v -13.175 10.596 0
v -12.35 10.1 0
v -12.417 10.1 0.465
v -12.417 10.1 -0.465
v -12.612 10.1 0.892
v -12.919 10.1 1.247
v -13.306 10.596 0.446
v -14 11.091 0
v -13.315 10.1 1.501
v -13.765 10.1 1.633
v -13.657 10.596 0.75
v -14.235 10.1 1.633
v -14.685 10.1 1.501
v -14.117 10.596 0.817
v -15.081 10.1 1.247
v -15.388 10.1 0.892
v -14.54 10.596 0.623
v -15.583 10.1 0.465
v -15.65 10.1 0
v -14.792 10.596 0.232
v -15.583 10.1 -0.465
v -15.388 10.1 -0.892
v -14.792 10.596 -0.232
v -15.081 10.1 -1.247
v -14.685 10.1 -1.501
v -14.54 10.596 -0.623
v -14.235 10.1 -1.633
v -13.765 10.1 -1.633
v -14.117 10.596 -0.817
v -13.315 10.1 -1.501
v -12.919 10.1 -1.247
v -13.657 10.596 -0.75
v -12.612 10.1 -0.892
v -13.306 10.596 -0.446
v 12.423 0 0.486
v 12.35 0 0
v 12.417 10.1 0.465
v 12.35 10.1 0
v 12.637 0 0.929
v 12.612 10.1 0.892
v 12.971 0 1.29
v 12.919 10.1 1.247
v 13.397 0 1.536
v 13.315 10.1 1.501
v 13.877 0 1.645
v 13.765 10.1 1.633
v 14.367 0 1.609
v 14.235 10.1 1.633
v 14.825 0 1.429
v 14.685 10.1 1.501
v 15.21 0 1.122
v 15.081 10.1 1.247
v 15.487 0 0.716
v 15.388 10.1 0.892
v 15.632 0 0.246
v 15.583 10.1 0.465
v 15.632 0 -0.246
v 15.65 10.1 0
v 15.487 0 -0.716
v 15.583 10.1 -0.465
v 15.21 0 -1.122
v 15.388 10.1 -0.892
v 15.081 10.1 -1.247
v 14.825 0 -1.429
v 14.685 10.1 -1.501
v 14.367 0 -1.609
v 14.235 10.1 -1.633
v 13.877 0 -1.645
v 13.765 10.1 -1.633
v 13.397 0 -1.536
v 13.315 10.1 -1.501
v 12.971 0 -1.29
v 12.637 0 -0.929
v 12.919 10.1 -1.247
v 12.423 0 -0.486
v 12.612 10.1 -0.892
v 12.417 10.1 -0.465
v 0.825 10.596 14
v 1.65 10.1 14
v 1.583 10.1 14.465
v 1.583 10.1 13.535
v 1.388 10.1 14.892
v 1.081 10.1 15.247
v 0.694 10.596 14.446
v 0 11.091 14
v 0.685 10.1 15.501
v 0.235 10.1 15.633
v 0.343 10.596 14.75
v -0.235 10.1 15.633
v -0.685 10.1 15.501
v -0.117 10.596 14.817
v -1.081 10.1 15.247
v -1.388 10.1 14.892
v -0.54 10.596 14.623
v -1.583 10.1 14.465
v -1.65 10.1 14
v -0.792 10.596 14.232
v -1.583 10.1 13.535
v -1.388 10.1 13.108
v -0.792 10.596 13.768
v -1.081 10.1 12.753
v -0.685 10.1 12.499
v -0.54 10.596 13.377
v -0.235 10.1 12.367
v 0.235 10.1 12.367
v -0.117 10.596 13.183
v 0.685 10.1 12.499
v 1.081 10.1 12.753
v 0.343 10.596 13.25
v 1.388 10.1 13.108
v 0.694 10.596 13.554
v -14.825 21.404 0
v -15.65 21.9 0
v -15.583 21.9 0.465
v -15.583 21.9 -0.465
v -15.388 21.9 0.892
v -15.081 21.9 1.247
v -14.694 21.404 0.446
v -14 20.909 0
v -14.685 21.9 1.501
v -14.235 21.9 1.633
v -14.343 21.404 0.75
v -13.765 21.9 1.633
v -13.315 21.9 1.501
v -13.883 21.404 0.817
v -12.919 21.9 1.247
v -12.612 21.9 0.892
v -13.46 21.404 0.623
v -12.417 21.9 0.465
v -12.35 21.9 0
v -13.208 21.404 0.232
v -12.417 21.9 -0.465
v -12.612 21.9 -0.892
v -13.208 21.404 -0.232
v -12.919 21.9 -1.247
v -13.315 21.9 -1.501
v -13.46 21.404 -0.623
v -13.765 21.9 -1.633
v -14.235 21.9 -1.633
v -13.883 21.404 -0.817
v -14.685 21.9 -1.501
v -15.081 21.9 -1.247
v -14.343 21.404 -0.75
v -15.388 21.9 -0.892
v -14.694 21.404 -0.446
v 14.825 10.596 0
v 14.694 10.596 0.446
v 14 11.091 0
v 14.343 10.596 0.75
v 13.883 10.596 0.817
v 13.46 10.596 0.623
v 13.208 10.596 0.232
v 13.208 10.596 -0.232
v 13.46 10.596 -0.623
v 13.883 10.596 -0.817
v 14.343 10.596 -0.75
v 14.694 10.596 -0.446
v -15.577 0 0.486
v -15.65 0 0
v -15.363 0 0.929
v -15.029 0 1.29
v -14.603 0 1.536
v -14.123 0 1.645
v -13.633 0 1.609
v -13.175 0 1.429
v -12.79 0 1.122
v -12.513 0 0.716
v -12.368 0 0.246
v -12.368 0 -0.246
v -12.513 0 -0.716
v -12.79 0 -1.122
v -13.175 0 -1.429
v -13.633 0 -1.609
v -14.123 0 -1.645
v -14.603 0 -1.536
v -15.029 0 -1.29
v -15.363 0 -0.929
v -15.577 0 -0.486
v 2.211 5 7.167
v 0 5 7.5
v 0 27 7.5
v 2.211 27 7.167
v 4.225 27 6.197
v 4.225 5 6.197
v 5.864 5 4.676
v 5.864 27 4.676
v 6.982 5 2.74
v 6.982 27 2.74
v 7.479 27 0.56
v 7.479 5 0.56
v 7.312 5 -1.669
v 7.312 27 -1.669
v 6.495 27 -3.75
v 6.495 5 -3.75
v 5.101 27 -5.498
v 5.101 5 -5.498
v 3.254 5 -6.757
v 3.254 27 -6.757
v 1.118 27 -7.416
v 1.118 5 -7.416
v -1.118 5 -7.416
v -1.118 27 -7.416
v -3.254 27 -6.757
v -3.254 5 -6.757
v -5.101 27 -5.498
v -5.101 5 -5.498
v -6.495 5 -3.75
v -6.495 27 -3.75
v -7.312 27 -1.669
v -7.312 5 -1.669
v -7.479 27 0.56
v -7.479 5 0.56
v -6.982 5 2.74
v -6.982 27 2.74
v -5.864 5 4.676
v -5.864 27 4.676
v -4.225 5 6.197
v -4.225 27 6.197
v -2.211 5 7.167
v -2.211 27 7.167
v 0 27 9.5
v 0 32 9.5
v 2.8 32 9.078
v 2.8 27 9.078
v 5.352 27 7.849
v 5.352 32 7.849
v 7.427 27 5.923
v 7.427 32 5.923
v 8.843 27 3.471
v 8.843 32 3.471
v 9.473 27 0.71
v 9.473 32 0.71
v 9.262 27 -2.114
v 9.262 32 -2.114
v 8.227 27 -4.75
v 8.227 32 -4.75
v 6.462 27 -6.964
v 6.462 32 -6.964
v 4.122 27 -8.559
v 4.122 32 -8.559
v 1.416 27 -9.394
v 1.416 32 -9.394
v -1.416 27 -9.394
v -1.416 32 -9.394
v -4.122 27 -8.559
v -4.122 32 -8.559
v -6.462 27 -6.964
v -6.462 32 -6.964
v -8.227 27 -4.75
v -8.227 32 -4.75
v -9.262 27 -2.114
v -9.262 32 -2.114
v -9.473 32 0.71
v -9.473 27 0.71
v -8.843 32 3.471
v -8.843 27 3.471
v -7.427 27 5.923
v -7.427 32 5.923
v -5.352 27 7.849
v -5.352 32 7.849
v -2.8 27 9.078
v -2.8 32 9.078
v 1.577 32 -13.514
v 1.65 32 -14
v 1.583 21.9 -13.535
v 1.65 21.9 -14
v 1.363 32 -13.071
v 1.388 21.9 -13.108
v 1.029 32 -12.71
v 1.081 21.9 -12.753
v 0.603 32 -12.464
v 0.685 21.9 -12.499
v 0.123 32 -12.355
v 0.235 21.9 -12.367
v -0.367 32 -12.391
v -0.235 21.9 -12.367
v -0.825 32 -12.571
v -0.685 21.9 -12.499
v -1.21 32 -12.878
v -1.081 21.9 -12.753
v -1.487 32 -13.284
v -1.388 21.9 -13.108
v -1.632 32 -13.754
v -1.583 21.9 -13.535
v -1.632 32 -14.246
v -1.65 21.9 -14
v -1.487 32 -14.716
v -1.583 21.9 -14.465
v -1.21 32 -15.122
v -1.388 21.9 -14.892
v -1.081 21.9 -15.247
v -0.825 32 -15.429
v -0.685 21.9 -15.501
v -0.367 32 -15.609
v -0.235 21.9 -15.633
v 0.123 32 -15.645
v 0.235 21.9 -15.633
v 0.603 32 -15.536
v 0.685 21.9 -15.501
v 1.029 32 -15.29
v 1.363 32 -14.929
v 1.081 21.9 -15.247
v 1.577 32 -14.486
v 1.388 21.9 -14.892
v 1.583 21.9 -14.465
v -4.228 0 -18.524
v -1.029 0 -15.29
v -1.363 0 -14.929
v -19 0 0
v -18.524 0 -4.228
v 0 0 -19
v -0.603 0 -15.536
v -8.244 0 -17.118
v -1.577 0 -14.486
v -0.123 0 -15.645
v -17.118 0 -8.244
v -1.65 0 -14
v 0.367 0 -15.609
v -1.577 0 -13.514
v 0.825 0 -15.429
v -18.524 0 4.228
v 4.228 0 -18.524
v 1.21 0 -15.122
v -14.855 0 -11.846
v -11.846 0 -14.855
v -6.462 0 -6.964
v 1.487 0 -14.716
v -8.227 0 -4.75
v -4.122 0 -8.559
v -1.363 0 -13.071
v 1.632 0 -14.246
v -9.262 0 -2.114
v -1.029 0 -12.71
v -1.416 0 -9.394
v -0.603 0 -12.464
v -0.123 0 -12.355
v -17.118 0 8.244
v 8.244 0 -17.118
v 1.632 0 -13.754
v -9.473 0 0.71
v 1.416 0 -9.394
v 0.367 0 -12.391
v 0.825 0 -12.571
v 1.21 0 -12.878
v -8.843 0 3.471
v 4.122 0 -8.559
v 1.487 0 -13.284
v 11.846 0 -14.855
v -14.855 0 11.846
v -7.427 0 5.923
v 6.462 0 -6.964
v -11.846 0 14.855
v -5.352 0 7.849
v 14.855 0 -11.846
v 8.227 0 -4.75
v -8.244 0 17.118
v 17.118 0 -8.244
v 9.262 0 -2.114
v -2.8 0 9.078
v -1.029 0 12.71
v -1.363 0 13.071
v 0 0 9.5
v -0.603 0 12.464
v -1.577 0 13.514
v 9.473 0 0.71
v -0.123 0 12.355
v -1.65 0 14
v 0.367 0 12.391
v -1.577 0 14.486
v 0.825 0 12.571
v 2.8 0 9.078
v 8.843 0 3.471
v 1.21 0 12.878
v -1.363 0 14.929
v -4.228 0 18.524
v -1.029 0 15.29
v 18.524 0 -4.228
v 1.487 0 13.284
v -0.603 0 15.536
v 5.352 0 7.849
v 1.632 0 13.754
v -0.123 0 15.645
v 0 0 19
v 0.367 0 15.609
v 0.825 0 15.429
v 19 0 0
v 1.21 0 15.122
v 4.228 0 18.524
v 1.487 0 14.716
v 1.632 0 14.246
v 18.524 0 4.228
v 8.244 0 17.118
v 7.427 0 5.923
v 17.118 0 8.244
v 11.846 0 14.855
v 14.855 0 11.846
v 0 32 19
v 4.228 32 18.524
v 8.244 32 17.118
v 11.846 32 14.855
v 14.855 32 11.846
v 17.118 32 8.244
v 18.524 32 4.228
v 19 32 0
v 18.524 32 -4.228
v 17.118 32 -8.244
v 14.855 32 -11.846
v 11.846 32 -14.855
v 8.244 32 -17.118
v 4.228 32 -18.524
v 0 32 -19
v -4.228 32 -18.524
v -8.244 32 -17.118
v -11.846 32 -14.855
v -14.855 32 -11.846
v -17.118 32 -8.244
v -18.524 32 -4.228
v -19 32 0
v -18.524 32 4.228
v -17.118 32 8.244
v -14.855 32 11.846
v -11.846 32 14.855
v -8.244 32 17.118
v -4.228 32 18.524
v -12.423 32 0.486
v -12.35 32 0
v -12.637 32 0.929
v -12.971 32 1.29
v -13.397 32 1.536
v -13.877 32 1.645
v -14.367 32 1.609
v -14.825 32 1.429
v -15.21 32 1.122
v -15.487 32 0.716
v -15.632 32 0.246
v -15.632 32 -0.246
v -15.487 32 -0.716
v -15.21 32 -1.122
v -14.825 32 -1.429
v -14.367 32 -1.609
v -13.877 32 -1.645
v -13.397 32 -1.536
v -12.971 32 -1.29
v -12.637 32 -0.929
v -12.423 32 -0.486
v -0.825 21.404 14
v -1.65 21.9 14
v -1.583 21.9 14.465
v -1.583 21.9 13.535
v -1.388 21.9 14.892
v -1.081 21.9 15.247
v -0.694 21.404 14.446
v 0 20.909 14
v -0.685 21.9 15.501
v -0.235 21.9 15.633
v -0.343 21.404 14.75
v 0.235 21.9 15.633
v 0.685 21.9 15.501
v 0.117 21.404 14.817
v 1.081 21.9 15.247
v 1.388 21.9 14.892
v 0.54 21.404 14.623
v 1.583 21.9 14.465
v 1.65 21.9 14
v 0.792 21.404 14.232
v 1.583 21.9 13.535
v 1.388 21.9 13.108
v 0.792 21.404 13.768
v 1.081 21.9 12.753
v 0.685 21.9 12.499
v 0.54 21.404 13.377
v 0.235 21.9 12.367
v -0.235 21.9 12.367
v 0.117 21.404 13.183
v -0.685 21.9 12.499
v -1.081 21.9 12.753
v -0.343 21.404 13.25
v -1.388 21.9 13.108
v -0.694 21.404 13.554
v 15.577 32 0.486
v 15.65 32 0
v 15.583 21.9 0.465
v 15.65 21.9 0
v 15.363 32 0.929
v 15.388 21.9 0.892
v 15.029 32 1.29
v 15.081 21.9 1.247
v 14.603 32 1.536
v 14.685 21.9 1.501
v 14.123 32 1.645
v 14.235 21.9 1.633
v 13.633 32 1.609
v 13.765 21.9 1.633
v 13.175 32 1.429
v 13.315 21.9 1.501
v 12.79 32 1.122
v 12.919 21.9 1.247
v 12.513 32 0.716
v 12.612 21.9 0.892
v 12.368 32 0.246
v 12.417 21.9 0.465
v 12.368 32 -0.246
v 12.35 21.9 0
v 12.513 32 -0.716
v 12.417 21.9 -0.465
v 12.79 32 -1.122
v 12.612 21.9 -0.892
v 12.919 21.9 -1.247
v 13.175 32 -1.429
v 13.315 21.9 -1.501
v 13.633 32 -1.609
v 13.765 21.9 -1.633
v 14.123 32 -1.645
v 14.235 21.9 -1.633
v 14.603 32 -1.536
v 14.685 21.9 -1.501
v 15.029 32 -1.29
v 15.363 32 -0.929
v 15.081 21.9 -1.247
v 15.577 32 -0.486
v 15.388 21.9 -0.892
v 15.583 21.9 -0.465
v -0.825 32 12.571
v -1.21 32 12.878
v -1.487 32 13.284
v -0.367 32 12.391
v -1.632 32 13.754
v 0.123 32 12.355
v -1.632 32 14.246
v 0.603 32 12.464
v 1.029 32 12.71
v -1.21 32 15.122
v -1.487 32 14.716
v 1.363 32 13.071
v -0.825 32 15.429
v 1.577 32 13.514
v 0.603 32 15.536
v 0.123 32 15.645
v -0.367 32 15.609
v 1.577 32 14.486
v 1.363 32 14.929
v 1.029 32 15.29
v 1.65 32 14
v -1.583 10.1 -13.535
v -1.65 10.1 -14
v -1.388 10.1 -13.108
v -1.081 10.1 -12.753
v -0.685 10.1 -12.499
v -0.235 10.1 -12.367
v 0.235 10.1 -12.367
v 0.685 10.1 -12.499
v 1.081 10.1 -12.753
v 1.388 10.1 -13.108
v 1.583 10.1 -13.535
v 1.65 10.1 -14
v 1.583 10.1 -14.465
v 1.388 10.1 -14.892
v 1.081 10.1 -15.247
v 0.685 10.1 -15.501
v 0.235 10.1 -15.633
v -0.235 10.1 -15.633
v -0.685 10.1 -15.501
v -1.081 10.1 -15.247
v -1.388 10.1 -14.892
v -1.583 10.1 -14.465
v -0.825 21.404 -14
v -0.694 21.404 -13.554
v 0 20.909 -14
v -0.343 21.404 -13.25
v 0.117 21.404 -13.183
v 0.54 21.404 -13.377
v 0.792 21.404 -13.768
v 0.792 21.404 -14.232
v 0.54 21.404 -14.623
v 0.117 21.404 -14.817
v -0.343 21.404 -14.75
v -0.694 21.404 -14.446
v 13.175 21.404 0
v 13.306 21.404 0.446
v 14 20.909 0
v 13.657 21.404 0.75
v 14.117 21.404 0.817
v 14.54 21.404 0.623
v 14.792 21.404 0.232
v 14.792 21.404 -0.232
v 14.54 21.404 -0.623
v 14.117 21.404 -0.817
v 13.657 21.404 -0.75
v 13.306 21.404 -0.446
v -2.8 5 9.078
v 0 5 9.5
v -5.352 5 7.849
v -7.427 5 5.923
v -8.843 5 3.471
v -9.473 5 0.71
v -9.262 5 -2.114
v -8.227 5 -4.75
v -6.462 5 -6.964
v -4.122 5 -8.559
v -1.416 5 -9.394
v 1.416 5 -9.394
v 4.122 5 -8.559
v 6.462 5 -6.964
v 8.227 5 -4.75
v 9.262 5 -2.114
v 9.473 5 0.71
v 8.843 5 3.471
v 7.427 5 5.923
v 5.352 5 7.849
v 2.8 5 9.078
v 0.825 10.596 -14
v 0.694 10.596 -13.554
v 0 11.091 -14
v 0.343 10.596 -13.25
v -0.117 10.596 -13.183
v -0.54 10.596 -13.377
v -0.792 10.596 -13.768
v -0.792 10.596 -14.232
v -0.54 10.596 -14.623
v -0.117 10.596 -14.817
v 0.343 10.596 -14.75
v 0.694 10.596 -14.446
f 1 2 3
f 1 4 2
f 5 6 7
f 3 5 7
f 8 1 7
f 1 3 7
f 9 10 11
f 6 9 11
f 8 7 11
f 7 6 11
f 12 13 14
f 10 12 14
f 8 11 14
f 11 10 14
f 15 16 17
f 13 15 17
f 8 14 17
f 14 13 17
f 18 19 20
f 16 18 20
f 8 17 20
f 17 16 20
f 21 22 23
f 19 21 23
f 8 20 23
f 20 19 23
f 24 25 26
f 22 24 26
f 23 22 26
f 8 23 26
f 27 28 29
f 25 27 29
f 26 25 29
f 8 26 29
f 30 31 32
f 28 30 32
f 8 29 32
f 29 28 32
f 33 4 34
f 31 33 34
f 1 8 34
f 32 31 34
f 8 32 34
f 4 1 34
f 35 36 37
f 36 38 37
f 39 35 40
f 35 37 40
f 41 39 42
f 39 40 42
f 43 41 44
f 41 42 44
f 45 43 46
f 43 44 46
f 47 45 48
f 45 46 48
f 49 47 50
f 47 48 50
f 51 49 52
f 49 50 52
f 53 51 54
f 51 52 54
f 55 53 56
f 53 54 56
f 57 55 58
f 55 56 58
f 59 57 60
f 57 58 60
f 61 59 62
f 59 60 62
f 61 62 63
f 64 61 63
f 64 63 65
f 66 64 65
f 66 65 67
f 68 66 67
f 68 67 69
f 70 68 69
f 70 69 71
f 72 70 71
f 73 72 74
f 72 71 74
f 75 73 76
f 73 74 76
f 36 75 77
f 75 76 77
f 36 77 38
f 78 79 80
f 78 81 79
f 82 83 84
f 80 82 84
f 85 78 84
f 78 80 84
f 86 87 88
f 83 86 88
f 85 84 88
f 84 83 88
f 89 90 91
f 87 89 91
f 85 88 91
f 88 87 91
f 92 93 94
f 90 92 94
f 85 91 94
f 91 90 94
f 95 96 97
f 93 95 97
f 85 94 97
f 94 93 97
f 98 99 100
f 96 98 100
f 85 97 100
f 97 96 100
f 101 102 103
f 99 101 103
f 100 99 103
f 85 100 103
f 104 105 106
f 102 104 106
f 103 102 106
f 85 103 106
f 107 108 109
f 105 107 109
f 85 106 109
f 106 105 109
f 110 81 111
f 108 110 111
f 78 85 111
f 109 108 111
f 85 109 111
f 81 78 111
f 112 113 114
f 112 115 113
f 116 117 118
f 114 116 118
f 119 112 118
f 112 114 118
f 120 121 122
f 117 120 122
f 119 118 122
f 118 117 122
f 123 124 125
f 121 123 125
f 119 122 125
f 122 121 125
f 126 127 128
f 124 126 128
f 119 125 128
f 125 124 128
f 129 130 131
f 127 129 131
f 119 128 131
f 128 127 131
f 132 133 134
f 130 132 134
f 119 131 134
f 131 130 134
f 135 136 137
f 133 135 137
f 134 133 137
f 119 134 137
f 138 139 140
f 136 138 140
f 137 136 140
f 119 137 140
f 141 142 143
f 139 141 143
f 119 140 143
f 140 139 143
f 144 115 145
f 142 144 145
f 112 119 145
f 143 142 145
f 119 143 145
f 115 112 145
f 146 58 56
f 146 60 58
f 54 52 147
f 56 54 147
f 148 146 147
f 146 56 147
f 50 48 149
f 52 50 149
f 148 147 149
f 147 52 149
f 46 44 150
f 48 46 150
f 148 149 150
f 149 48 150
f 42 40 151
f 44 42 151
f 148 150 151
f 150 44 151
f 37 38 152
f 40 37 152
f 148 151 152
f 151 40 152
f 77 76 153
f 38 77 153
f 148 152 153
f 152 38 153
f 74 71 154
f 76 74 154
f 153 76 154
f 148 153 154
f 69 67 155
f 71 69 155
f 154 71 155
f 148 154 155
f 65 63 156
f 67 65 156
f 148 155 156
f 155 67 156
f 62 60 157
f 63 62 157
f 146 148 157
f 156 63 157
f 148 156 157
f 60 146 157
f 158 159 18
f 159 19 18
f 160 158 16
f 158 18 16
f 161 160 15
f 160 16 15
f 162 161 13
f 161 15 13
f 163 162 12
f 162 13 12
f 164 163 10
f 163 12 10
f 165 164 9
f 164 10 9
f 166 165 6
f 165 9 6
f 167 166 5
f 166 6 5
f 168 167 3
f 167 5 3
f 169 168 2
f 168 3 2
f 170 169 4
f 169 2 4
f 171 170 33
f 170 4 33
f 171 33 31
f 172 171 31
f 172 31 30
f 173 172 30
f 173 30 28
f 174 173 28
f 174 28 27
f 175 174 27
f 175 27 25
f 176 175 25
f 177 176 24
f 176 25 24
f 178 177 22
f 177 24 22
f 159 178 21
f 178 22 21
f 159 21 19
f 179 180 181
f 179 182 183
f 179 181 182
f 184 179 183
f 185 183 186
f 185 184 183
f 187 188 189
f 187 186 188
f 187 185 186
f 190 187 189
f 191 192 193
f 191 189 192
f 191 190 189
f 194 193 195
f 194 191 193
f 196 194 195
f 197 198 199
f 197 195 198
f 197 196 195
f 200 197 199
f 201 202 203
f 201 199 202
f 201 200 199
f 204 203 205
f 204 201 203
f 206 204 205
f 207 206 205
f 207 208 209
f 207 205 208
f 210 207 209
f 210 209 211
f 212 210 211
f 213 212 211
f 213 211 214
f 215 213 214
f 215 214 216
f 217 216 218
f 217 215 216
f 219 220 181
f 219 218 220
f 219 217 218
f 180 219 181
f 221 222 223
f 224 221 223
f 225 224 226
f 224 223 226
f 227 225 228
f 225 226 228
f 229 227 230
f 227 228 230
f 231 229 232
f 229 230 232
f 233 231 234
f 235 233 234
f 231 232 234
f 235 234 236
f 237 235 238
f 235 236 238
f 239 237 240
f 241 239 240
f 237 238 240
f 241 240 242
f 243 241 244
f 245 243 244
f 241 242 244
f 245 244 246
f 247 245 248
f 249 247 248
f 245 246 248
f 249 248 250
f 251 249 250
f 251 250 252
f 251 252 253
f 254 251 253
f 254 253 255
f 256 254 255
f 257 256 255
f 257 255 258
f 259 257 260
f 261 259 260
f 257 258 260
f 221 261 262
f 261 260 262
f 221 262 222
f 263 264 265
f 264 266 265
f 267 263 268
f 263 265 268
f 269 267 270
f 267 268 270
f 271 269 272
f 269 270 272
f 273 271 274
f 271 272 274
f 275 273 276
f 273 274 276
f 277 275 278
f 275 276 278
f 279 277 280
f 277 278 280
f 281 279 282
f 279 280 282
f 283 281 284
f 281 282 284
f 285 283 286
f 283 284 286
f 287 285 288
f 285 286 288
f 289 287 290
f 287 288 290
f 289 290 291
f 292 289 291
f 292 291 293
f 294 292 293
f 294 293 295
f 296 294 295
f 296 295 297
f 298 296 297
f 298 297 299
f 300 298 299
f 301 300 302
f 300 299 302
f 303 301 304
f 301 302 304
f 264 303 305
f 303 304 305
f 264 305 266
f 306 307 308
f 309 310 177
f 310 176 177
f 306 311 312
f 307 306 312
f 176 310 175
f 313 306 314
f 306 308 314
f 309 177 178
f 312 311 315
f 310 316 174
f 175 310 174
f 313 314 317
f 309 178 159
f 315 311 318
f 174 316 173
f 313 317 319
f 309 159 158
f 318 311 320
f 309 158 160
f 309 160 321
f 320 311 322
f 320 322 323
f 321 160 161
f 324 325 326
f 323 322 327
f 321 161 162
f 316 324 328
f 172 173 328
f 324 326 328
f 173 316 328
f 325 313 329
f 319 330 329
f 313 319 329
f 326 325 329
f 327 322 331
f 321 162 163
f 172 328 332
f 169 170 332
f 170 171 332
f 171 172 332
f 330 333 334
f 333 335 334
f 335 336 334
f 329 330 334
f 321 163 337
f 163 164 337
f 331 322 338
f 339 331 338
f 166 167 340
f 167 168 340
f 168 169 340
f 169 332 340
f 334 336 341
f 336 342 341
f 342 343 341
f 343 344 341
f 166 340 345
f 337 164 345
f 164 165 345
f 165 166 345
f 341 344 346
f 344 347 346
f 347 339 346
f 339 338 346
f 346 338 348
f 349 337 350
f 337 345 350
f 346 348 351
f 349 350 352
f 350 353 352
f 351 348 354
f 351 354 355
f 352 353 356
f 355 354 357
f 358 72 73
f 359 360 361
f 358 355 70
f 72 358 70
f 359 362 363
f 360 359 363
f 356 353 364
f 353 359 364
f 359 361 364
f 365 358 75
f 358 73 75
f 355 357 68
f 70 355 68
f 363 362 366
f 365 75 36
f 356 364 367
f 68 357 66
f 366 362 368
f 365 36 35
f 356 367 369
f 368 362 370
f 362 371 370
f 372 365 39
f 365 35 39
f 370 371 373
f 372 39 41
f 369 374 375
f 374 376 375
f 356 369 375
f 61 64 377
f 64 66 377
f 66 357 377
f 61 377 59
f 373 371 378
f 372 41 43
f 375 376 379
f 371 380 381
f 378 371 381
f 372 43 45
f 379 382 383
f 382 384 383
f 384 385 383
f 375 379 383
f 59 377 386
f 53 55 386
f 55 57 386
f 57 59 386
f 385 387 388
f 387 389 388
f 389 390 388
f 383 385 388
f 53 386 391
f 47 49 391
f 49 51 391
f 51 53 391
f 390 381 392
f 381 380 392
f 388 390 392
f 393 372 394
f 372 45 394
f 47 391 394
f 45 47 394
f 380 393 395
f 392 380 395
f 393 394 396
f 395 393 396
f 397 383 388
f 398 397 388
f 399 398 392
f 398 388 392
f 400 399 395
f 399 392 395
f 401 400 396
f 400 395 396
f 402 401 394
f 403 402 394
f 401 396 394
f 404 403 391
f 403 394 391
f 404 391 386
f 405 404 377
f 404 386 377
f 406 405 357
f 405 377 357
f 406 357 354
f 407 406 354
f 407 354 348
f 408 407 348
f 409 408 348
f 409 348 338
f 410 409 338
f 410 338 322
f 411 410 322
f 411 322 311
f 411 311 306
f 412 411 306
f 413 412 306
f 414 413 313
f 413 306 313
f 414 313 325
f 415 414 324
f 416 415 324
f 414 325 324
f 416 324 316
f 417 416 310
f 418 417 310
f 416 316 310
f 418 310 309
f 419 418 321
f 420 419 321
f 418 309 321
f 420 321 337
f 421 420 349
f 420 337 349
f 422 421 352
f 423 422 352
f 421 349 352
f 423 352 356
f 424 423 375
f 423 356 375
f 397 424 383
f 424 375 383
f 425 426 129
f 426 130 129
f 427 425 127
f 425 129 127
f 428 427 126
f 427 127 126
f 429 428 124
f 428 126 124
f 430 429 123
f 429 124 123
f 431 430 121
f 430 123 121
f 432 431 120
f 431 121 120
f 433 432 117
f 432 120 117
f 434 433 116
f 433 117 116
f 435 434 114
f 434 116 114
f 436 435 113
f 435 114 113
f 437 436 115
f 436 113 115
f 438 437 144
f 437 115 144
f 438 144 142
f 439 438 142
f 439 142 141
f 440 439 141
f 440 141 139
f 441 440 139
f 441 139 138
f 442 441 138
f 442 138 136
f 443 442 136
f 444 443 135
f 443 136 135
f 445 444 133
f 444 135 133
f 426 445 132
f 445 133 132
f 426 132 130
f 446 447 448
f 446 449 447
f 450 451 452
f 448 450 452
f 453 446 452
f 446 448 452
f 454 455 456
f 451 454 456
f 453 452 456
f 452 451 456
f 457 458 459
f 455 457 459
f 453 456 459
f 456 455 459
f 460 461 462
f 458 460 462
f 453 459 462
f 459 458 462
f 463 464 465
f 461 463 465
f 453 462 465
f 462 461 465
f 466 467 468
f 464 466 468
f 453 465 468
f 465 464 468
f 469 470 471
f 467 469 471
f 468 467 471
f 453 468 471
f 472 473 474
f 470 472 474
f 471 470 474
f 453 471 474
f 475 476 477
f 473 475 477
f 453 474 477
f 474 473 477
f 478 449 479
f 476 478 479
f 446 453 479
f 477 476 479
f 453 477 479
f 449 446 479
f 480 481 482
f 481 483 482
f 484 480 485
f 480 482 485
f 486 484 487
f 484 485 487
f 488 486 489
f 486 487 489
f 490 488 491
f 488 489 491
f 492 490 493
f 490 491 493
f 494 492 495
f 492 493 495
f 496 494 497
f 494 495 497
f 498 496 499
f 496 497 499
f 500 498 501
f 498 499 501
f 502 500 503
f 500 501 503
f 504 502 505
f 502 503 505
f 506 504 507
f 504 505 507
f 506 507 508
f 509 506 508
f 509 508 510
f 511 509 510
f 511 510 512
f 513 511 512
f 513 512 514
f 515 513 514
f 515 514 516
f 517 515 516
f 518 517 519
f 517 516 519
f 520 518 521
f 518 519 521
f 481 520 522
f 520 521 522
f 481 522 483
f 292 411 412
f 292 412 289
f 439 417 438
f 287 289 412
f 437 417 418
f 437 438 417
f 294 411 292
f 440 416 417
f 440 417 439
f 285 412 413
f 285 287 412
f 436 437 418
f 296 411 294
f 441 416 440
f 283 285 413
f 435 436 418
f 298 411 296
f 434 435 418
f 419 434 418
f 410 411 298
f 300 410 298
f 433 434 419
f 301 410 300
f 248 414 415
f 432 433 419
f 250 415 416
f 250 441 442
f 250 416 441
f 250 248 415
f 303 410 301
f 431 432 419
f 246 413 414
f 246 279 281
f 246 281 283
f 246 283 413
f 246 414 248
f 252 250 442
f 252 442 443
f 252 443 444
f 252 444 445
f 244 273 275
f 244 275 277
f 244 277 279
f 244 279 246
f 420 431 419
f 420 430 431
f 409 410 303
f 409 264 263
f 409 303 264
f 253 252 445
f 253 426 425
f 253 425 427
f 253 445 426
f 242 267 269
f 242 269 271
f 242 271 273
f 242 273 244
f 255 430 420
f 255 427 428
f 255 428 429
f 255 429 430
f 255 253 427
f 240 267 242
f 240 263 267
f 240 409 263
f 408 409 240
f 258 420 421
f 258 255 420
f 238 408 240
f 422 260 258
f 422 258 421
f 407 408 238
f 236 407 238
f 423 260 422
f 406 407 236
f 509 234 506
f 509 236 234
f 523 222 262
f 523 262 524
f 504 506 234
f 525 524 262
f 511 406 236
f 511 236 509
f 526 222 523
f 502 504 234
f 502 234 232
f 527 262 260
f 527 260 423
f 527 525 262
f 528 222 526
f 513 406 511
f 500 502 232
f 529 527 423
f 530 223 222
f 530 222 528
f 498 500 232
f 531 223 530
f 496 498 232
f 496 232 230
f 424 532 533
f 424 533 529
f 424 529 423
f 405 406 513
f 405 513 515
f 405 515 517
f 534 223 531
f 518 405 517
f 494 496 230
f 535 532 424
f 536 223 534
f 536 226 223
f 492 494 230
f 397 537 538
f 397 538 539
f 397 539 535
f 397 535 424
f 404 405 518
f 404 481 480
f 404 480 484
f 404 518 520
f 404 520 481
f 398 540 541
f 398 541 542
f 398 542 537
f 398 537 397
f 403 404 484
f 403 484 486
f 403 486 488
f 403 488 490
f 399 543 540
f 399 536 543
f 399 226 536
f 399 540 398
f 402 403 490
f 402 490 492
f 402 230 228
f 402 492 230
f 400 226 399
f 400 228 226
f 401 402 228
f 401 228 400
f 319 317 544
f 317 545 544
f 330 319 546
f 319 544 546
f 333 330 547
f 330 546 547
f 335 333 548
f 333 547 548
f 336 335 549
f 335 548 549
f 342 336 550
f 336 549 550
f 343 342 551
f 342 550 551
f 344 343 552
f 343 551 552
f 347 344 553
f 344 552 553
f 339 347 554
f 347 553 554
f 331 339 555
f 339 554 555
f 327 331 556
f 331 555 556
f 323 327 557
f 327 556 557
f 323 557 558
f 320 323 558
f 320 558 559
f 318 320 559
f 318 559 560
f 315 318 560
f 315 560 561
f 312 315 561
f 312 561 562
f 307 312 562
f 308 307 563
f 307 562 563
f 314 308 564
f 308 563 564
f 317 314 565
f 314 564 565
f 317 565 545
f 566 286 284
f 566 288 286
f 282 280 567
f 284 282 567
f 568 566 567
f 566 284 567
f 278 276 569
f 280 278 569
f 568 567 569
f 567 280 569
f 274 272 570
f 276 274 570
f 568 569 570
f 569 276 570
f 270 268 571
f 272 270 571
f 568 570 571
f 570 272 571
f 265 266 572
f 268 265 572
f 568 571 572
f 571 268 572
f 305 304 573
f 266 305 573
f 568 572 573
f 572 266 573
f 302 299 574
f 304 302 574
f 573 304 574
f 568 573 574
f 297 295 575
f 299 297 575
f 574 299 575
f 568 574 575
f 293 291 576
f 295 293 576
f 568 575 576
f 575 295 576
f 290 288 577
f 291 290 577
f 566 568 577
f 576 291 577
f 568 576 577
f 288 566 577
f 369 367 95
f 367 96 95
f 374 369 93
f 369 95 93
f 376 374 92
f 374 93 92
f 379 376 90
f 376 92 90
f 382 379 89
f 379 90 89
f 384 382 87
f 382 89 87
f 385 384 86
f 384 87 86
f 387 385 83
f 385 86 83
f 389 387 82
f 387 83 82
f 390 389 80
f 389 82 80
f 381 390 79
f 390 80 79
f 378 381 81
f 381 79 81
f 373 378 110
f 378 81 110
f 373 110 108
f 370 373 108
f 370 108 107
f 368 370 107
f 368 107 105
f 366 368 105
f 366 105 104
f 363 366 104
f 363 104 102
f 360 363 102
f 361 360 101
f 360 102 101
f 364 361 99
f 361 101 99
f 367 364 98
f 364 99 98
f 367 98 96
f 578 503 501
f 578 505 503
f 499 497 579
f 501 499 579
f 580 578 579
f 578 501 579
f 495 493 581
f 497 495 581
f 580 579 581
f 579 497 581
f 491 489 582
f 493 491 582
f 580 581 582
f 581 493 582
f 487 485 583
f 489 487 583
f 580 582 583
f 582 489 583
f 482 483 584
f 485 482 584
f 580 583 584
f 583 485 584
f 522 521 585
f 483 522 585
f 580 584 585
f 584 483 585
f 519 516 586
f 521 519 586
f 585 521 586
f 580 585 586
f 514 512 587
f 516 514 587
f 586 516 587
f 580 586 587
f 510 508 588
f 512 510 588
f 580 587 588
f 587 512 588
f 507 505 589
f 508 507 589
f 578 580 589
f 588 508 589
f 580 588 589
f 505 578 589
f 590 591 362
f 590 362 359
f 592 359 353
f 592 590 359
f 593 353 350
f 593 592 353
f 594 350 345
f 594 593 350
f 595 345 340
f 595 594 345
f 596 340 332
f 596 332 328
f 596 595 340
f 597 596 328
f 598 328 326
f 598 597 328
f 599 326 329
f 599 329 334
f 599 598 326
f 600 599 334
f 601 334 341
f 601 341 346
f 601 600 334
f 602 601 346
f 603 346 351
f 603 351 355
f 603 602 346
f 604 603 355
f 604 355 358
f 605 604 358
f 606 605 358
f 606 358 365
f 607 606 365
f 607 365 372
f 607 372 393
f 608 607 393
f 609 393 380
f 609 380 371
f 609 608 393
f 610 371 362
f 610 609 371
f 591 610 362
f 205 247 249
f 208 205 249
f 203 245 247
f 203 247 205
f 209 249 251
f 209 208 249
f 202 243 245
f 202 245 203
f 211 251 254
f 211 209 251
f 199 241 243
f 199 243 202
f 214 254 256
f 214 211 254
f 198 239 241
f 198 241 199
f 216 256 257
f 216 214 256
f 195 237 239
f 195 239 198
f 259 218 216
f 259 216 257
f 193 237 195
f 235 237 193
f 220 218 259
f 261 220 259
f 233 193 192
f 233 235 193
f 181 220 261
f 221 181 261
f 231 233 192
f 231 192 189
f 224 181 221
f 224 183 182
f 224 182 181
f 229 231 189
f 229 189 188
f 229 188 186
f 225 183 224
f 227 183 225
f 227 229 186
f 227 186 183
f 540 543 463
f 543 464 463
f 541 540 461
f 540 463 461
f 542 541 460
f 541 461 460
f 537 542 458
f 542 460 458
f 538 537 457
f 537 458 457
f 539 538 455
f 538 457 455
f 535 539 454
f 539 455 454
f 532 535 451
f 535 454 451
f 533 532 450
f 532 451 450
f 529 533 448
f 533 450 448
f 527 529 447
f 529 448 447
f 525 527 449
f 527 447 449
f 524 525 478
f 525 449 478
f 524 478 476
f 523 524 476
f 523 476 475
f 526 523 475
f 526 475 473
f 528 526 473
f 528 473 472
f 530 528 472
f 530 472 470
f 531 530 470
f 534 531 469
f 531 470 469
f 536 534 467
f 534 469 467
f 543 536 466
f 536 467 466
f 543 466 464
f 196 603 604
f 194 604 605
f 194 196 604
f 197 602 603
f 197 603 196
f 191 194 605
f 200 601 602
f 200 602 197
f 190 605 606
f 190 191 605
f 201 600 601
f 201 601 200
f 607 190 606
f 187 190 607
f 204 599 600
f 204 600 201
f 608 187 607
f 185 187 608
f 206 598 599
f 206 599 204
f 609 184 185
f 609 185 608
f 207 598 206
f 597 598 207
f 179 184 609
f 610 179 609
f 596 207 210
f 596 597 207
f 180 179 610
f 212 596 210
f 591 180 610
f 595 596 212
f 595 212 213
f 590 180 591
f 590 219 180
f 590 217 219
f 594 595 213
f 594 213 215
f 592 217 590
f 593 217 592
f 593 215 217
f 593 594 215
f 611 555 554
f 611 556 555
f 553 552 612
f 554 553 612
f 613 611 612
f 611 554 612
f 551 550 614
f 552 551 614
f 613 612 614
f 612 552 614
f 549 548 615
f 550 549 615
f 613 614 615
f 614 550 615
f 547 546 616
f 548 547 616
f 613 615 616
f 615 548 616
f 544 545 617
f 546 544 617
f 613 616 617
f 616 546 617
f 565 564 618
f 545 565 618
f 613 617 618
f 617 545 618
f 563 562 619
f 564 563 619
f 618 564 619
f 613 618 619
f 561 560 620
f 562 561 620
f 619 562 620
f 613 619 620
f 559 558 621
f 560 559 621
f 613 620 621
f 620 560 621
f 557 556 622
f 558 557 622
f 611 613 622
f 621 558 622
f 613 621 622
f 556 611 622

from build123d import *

# Parameters (mm, degrees)
SKETCH_1_R             = 19
SKETCH_1_R_2           = 7.5
EXTRUDE_1_DEPTH        = 32
SKETCH_2_R             = 9.5
CUT_EXTRUDE_1_DEPTH    = 5
CUT_EXTRUDE_START      = -5
SKETCH_3_R             = 9.5
CUT_EXTRUDE_2_DEPTH    = 5
HOLE_WIZARD_M4_1_D     = 3.3
HOLE_WIZARD_M4_1_DEPTH = 10.1
HOLE_WIZARD_M4_1_TIP   = 0.991420021
HOLE_WIZARD_M4_2_D     = 3.3
HOLE_WIZARD_M4_2_DEPTH = 10.1
HOLE_WIZARD_M4_2_TIP   = 0.991420021


with BuildPart() as part:
    # 草图1 → 凸台-拉伸1 (new body)
    with BuildSketch(Plane(origin=(0, 0, 0), x_dir=(1, 0, 0), z_dir=(0, 1, 0))):
        with Locations(Location((0, 0, 0), (0, 0, 270))):
            Circle(SKETCH_1_R)
        with Locations(Location((0, 0, 0), (0, 0, 270))):
            Circle(SKETCH_1_R_2, mode=Mode.SUBTRACT)
    extrude(amount=EXTRUDE_1_DEPTH)

    # 草图2 → 切除-拉伸1 (cut)
    with BuildSketch(Plane(origin=(0, 32, 0), x_dir=(1, 0, 0), z_dir=(0, 1, 0))):
        with Locations(Location((0, 0, 0), (0, 0, 270))):
            Circle(SKETCH_2_R)
    extrude(amount=-CUT_EXTRUDE_1_DEPTH, mode=Mode.SUBTRACT)

    # 草图3 → 切除-拉伸2 (cut)
    with BuildSketch(Plane.XZ.offset(CUT_EXTRUDE_START)):
        with Locations(Location((0, 0, 0), (0, 0, 90))):
            Circle(SKETCH_3_R)
    extrude(amount=CUT_EXTRUDE_2_DEPTH, mode=Mode.SUBTRACT)

    # M4 螺纹孔1
    with Locations(Plane.XZ):
        with Locations((0, -14), (-14, 0), (0, 14), (14, 0)):
            Hole(HOLE_WIZARD_M4_1_D / 2, depth=HOLE_WIZARD_M4_1_DEPTH)
            with Locations((0, 0, -(HOLE_WIZARD_M4_1_DEPTH + HOLE_WIZARD_M4_1_TIP / 2))):  # 118° drill point
                Cone(0, HOLE_WIZARD_M4_1_D / 2, HOLE_WIZARD_M4_1_TIP, mode=Mode.SUBTRACT)

    # M4 螺纹孔2
    with Locations(Plane(origin=(0, 32, 0), x_dir=(-1, 0, 0), z_dir=(0, 1, 0))):
        with Locations((-14, 0), (0, 14), (14, 0), (0, -14)):
            Hole(HOLE_WIZARD_M4_2_D / 2, depth=HOLE_WIZARD_M4_2_DEPTH)
            with Locations((0, 0, -(HOLE_WIZARD_M4_2_DEPTH + HOLE_WIZARD_M4_2_TIP / 2))):  # 118° drill point
                Cone(0, HOLE_WIZARD_M4_2_D / 2, HOLE_WIZARD_M4_2_TIP, mode=Mode.SUBTRACT)


solid = part.part
